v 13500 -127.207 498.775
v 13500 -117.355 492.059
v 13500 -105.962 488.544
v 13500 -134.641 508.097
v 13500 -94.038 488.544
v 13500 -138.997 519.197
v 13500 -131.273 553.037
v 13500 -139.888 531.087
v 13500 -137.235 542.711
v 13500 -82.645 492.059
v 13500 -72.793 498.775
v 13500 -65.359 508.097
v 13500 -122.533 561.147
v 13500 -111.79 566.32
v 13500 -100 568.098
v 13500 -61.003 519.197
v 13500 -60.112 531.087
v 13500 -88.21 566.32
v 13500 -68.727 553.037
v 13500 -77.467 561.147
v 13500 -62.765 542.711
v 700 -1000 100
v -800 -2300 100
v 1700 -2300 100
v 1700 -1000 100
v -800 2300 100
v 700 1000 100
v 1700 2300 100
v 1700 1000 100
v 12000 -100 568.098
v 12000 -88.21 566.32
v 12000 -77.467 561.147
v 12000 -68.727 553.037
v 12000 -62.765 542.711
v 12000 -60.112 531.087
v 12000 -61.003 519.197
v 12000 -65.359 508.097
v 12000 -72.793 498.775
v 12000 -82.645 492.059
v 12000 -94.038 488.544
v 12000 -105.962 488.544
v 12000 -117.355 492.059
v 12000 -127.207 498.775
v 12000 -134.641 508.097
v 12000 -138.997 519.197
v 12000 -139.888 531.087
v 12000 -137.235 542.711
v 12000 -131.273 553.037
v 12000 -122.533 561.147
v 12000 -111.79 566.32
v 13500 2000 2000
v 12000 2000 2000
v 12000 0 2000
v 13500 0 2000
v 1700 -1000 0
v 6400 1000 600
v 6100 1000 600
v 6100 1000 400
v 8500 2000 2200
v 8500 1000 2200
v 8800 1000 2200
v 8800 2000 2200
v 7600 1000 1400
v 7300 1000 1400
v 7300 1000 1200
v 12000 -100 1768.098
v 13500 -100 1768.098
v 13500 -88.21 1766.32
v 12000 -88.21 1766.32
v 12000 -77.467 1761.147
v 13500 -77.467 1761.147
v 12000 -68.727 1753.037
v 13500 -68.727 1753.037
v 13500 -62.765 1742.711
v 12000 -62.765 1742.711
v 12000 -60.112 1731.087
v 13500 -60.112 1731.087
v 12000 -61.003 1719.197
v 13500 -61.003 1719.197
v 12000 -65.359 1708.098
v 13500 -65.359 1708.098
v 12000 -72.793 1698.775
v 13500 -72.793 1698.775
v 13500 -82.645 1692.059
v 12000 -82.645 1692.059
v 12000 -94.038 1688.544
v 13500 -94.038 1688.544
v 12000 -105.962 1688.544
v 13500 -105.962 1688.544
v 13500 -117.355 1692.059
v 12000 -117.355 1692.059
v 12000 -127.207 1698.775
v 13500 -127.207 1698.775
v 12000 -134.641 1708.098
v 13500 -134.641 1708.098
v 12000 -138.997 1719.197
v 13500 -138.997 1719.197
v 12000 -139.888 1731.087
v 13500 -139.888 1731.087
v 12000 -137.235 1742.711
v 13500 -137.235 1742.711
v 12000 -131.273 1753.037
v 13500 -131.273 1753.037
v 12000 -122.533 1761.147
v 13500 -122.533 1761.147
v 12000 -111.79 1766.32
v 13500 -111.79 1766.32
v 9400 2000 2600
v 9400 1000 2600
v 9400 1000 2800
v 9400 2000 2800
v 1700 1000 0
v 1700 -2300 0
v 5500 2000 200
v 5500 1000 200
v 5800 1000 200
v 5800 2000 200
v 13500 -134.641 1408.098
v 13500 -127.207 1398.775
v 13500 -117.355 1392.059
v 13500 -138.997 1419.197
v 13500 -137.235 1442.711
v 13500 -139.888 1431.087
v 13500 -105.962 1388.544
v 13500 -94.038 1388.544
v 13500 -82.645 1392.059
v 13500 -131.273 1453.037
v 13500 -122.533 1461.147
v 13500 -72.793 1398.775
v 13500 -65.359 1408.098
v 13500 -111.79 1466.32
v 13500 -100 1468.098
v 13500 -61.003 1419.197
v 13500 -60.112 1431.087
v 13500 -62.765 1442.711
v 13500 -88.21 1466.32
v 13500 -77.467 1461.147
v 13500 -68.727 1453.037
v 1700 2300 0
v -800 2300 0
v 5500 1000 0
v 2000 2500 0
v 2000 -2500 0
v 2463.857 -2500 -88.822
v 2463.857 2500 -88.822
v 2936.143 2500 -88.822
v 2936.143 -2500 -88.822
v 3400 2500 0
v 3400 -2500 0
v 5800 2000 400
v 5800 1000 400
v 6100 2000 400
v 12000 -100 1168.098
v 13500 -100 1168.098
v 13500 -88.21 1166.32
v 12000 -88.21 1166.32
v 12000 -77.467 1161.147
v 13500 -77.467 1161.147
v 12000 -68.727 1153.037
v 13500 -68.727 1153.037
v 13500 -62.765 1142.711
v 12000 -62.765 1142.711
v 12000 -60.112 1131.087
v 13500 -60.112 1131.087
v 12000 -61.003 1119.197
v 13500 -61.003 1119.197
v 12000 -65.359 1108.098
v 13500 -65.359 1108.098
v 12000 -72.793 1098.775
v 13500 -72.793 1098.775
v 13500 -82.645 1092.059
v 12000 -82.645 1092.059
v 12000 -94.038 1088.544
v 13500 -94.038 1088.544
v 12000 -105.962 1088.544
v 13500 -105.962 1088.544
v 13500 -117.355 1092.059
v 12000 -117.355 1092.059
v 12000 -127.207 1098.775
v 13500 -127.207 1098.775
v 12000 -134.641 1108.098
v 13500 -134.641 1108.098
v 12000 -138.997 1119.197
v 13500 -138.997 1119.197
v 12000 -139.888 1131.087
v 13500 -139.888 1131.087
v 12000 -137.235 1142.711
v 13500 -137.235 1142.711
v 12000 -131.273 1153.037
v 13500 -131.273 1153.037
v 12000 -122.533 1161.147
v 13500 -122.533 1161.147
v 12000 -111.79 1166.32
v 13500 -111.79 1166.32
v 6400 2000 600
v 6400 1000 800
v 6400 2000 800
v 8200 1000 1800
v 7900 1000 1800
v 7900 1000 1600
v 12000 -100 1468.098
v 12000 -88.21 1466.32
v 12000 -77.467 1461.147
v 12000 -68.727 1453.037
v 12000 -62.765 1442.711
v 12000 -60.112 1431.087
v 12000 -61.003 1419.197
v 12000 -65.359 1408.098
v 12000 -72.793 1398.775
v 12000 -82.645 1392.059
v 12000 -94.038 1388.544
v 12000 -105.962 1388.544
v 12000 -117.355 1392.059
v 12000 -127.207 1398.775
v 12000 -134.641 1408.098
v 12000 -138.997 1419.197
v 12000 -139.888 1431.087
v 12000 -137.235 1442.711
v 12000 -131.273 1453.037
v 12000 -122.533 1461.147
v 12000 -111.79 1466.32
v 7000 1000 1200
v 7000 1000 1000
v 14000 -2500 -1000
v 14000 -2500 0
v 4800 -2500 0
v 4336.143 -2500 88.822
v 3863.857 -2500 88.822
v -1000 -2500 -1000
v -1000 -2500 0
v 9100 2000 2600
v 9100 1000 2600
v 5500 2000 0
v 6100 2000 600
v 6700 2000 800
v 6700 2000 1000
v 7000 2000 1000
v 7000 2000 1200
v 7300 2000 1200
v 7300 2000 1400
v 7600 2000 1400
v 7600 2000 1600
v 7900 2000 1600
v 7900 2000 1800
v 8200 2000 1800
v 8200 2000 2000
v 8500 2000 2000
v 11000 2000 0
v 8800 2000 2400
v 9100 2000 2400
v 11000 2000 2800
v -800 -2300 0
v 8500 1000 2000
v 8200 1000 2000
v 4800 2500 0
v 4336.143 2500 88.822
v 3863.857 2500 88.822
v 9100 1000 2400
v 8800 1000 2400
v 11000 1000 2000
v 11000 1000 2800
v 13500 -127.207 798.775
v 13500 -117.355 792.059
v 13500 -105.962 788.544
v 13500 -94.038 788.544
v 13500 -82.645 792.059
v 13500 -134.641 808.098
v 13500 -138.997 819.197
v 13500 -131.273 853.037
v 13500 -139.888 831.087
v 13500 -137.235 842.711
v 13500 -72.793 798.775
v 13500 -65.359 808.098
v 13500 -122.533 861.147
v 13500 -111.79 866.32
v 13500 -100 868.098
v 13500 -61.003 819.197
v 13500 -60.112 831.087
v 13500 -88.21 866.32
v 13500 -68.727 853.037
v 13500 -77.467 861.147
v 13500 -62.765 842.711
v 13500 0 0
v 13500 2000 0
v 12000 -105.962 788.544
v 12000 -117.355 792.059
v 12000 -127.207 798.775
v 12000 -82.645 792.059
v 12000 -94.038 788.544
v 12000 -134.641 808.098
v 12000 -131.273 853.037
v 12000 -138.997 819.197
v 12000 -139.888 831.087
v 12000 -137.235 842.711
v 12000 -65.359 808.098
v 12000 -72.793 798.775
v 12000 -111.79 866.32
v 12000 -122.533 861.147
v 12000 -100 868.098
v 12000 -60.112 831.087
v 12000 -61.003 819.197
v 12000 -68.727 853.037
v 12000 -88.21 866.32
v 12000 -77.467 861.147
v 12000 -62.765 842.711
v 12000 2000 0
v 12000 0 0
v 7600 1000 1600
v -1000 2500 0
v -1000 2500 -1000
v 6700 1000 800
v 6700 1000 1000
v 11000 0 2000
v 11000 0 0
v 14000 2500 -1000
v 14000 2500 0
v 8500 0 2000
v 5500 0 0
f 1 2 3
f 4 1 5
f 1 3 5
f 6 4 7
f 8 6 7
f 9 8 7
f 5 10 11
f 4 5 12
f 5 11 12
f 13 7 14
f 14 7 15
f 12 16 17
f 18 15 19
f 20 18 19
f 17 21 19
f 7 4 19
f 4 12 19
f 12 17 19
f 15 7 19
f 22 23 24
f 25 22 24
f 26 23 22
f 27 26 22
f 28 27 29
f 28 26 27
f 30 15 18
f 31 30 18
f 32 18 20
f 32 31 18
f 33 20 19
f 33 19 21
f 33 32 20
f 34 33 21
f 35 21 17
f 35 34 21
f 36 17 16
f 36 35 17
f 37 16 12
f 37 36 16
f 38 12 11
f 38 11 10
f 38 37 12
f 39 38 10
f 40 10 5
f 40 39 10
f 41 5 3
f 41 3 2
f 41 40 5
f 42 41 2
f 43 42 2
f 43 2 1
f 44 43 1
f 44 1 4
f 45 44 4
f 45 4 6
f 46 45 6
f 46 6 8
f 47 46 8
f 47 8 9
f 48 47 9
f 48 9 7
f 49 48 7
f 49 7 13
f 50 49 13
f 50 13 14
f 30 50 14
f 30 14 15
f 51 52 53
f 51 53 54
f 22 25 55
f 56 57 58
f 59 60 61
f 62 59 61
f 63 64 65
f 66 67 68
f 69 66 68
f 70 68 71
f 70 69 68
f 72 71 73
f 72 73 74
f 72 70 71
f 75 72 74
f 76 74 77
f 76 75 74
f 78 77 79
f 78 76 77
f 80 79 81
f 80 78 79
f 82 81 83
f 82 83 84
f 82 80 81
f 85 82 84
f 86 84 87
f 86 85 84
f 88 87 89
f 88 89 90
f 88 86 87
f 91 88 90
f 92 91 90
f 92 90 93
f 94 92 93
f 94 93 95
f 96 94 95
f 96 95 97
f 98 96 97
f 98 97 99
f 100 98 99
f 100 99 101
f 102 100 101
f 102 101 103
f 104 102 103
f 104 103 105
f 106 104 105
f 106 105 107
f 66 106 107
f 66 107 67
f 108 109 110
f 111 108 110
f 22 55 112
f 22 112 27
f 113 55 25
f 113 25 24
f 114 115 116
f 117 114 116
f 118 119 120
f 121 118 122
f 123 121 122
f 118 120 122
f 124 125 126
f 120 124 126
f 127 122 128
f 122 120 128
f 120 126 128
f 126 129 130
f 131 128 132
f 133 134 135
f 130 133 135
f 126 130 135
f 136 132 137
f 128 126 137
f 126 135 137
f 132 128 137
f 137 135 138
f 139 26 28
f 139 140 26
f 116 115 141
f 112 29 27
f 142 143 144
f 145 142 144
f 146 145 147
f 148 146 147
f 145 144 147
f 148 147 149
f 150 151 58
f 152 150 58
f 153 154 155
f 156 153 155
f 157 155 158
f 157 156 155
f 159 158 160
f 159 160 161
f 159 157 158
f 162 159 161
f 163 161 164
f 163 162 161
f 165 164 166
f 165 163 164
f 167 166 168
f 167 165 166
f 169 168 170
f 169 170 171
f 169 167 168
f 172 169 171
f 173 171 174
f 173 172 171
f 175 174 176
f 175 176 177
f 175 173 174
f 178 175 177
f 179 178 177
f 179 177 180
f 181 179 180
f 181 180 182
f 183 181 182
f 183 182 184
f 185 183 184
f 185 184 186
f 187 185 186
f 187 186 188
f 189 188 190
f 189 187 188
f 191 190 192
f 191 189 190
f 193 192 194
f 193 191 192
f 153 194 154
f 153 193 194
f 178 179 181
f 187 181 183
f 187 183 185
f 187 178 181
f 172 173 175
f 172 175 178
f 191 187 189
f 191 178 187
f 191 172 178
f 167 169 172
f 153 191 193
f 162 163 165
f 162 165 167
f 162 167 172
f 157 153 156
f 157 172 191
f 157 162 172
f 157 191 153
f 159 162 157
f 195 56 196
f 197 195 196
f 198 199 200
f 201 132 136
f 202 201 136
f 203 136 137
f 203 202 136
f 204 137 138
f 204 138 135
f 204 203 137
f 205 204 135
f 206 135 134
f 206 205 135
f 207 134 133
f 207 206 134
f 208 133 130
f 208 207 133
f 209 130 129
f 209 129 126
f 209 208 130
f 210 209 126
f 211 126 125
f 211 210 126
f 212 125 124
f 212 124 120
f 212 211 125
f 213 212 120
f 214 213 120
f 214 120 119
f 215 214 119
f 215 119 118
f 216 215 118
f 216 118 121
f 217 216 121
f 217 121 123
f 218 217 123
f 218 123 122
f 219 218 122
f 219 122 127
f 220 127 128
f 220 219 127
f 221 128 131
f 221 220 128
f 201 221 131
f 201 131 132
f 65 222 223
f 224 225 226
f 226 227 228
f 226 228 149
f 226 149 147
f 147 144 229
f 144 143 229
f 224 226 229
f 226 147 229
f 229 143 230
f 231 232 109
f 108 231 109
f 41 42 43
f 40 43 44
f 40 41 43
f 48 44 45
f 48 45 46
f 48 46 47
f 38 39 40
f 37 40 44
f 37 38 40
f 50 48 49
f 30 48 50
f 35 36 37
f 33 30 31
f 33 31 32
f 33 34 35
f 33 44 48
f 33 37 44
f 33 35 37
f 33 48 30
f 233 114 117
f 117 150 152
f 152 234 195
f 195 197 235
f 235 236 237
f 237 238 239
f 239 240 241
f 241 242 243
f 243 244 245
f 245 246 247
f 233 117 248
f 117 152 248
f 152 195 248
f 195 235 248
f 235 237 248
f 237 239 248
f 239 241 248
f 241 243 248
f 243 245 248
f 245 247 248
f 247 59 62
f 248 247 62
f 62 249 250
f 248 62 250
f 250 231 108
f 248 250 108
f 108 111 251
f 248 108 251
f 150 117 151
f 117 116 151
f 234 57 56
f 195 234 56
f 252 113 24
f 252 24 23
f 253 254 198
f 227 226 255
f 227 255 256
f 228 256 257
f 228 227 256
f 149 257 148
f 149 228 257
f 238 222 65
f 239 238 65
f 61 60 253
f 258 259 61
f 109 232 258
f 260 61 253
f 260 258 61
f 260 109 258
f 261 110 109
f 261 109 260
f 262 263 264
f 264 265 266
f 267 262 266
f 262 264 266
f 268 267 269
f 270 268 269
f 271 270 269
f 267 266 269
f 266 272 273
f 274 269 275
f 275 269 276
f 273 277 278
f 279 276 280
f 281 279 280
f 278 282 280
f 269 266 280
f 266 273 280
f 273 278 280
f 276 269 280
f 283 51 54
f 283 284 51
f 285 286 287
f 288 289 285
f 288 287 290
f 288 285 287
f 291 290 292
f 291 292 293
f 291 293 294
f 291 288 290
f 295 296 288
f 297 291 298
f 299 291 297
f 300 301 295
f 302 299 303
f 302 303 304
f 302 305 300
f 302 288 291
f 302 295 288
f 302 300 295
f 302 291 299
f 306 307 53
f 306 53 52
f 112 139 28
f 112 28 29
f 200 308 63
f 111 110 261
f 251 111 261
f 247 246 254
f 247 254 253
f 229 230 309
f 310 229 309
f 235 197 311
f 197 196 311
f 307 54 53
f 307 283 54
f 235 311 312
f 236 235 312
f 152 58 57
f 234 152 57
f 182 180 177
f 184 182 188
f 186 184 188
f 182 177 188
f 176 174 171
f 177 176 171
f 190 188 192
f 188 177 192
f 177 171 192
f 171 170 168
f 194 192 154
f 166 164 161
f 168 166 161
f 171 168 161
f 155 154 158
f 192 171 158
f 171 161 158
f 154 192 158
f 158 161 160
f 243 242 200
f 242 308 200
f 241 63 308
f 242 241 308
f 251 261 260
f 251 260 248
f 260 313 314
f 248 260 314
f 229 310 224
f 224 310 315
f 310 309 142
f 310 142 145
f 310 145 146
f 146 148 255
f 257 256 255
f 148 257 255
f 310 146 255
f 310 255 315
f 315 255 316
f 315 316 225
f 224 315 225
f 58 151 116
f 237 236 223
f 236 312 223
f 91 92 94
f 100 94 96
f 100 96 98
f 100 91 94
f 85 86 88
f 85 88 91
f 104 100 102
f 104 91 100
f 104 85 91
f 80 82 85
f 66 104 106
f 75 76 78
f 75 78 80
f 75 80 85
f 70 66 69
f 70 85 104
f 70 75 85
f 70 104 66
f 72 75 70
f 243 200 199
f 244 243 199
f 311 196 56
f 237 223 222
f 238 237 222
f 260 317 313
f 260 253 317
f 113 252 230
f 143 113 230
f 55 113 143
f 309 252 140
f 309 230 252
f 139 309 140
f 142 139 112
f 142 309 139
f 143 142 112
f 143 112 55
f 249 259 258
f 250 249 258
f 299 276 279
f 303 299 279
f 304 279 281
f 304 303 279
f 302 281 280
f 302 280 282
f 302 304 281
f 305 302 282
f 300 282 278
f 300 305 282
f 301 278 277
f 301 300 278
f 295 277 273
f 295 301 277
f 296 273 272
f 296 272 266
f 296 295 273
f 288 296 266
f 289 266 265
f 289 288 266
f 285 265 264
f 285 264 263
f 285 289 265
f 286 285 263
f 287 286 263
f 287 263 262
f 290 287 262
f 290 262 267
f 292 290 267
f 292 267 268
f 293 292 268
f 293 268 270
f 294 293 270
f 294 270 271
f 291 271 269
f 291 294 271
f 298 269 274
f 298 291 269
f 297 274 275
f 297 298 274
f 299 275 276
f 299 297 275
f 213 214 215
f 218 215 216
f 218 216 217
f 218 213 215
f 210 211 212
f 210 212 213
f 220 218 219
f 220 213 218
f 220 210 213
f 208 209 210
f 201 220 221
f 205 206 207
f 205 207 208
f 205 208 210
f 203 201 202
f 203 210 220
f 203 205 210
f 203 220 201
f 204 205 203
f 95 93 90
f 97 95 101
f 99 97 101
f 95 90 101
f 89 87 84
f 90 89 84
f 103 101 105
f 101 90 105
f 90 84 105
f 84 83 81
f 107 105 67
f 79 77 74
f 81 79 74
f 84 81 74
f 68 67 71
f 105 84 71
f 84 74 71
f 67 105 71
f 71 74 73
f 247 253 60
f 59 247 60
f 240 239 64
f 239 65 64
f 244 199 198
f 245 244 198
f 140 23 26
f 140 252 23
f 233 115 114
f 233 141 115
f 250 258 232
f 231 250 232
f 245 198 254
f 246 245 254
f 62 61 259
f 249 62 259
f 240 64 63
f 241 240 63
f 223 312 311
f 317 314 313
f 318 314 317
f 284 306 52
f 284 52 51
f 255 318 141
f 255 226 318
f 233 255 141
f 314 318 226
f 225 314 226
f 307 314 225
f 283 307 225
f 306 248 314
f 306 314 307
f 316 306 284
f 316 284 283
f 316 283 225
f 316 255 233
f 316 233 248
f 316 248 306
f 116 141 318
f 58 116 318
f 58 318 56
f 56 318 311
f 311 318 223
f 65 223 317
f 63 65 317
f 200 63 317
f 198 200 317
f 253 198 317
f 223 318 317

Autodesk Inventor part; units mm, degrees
ref_plane "YZ Plane" through (0, 0, 0) normal (1, 0, 0) x (0, 1, 0)
ref_plane "XZ Plane" through (0, 0, 0) normal (0, 1, 0) x (-1, 0, 0)
ref_plane "XY Plane" through (0, 0, 0) normal (0, 0, 1) x (1, 0, 0)
sketch "スケッチ1" plane through (0, 0, 0) normal (0, 0, 1) x (1, 0, 0)
  line L0 (-1000, 2500) -> (14000, 2500)
  line L1 (14000, 2500) -> (14000, -2500)
  line L2 (14000, -2500) -> (-1000, -2500)
  line L3 (-1000, -2500) -> (-1000, 2500)
  line L4 (0, 3500) -> (0, -3500) projected
  point P0 (0, 0)
  point P1 (-1000, 0)
  dimension "d0" = 5000
  dimension "d1" = 1000
  dimension "d2" = 15000
extrude "押し出し1" add sketch "スケッチ1" against normal blind 1000
sketch "スケッチ2" plane through (0, 0, 0) normal (0, 0, 1) x (1, 0, 0)
  line L0 (12000, 2000) -> (13500, 2000)
  line L1 (13500, 2000) -> (13500, 0)
  line L2 (13500, 0) -> (12000, 0)
  line L3 (12000, 0) -> (12000, 2000)
  line L4 (14000, 2500) -> (-1000, 2500) projected
  line L5 (14000, -2500) -> (14000, 2500) projected
  point P0 (0, 0)
  dimension "d31" = 1500
  dimension "d32" = 2000
  dimension "d72" = 500
  dimension "d73" = 500
extrude "押し出し2" add sketch "スケッチ2" along normal blind 2000
sketch "スケッチ3" plane through (0, 0, 0) normal (0, 0, 1) x (1, 0, 0)
  line L0 (5500, 2000) -> (11000, 2000)
  line L1 (11000, 2000) -> (11000, 0)
  line L2 (11000, 0) -> (5500, 0)
  line L3 (5500, 0) -> (5500, 2000)
  line L4 (12000, 2000) -> (12000, 0) projected
  point P0 (0, 0)
  dimension "d28" = 1000
  dimension "d35" = 2000
  dimension "d71" = 5500
extrude "押し出し3" add sketch "スケッチ3" along normal blind 2000
sketch "スケッチ4" plane through (5500, 0, 0) normal (0, -1, 0) x (1, 0, 0)
  line L0 (0, 0) -> (3000, 2000)
  line L1 (3000, 2000) -> (0, 2000)
  line L2 (0, 2000) -> (0, 0)
  line L3 (0, 0) -> (0, 2000) projected
  line L4 (-6500, 0) -> (8500, 0) projected
  point P0 (-5500, 0)
  dimension "d23" = 3000
extrude "押し出し4" cut sketch "スケッチ4" against normal blind 1000
sketch "スケッチ5" plane through (12000, 0, 0) normal (-1, 0, 0) x (0, 0, 1)
  circle A0 centre (1728.0975, -100) radius 40
  circle A1 centre (1428.0975, -100) radius 40
  circle A2 centre (1128.0975, -100) radius 40
  circle A3 centre (828.0975, -100) radius 40
  circle A4 centre (528.0975, -100) radius 40
  line L0 (0, 0) -> (2000, 0) projected
  line L1 (0, 2500) -> (0, -2500) projected
  point P0 (0, 0)
  dimension "d11" = 80
  dimension "d12" = 80
  dimension "d13" = 80
  dimension "d14" = 80
  dimension "d15" = 80
  dimension "d16" = 300
  dimension "d17" = 300
  dimension "d18" = 300
  dimension "d19" = 300
  dimension "d20" = 100
  dimension "d82" = 528.0975
extrude "押し出し5" add sketch "スケッチ5" against normal blind 1500
sketch "スケッチ6" plane through (5500, 1000, 0) normal (0, -1, 0) x (1, 0, 0)
  line L0 (0, 0) -> (0, 2000) projected
  line L1 (0, 200) -> (300, 200)
  line L2 (300, 200) -> (300, 400)
  line L3 (300, 400) -> (600, 400)
  line L4 (600, 400) -> (600, 600)
  line L5 (600, 600) -> (900, 600)
  line L6 (900, 600) -> (900, 800)
  line L7 (900, 800) -> (1200, 800)
  line L8 (1200, 800) -> (1200, 1000)
  line L9 (1200, 1000) -> (1500, 1000)
  line L10 (1500, 1000) -> (1500, 1200)
  line L11 (1500, 1200) -> (1800, 1200)
  line L12 (1800, 1200) -> (1800, 1400)
  line L13 (1800, 1400) -> (2100, 1400)
  line L14 (2100, 1400) -> (2100, 1600)
  line L15 (2100, 1600) -> (2400, 1600)
  line L16 (2400, 1600) -> (2400, 1800)
  line L17 (2400, 1800) -> (2700, 1800)
  line L18 (2700, 1800) -> (2700, 2000)
  line L19 (2700, 2000) -> (0, 2000)
  line L20 (0, 2000) -> (0, 200)
  line L21 (-6500, 0) -> (8500, 0) projected
  point P0 (-5500, 0)
  dimension "d46" = 200
  dimension "d47" = 300
  dimension "d48" = 200
  dimension "d49" = 300
  dimension "d50" = 200
  dimension "d51" = 300
  dimension "d52" = 200
  dimension "d53" = 300
  dimension "d54" = 200
  dimension "d55" = 300
  dimension "d56" = 200
  dimension "d57" = 300
  dimension "d58" = 200
  dimension "d59" = 300
  dimension "d60" = 200
  dimension "d61" = 300
  dimension "d62" = 200
  dimension "d63" = 300
extrude "押し出し6" cut sketch "スケッチ6" against normal blind 1500
sketch "スケッチ7" plane through (0, 0, 0) normal (0, 0, 1) x (1, 0, 0)
  line L0 (-800, 2300) -> (1700, 2300)
  line L1 (1700, 2300) -> (1700, -2300)
  line L2 (1700, -2300) -> (-800, -2300)
  line L3 (-800, -2300) -> (-800, 2300)
  line L4 (-1000, 2500) -> (-1000, -2500) projected
  line L5 (14000, 2500) -> (-1000, 2500) projected
  line L6 (-1000, -2500) -> (14000, -2500) projected
  point P0 (0, 0)
  dimension "d74" = 200
  dimension "d75" = 200
  dimension "d76" = 200
  dimension "d77" = 2500
extrude "押し出し7" add sketch "スケッチ7" along normal blind 100
sketch "スケッチ8" plane through (5500, 1000, 0) normal (0, -1, 0) x (1, 0, 0)
  line L0 (3000, 2000) -> (3000, 2200)
  line L1 (3000, 2200) -> (3300, 2200)
  line L2 (3300, 2200) -> (3300, 2400)
  line L3 (3300, 2400) -> (3600, 2400)
  line L4 (3600, 2400) -> (3600, 2600)
  line L5 (3600, 2600) -> (3900, 2600)
  line L6 (3900, 2600) -> (3900, 2800)
  line L7 (3900, 2800) -> (4177.5018, 2800)
  line L8 (4177.5018, 2800) -> (5500, 2800)
  line L9 (5500, 2000) -> (2700, 2000) projected
  line L10 (5500, 2800) -> (5500, 2000)
  line L11 (5500, 2000) -> (3000, 2000)
  point P0 (-5500, 0)
  point P1 (3020.6908, 2000)
  dimension "d64" = 200
  dimension "d65" = 300
  dimension "d66" = 200
  dimension "d67" = 300
  dimension "d68" = 200
  dimension "d69" = 300
  dimension "d70" = 200
extrude "押し出し8" add sketch "スケッチ8" against normal blind 1000
sketch "スケッチ9" plane through (0, 0, 0) normal (0, 1, 0) x (-1, 0, 0)
  line L0 (-1700, 0) -> (-1700, 100) projected
  line L1 (-1700, 0) -> (-700, 100)
  line L2 (-700, 100) -> (-1700, 100)
  line L3 (-1700, 100) -> (-1700, 0)
  point P0 (0, 0)
  dimension "d78" = 1000
extrude "押し出し9" cut sketch "スケッチ9" along normal mid plane 2000
sketch "スケッチ11" plane through (-1000, -2500, 0) normal (0, -1, 0) x (1, 0, 0)
  circle A0 centre (3700, 2400) radius 2500
  line L0 (0, 0) -> (15000, 0) projected
  line L1 (2700, 0) -> (2700, 100) projected
  line L2 (4400, 0) -> (3000, 0)
  line L3 (3247.7684, -100) -> (4192.4958, -100) construction
  point P0 (1000, 0)
  dimension "d36" = 5000
  dimension "d38" = 2400
  dimension "d79" = 1000
  dimension "d80" = 1400
  dimension "d81" = 100
extrude "押し出し10" cut sketch "スケッチ11" against normal through all
sketch "スケッチ12" plane through (-1000, -2500, -1000) normal (0, -1, 0) x (1, 0, 0)
  arc A0 (7171.2315, 0) -> (3028.7685, 0) centre (5100, -1400) ccw
  arc A1 (3000, 1000) -> (4400, 1000) centre (3700, 3400) ccw projected
  line L0 (4400, 1000) -> (15000, 1000) projected
  line L1 (15000, 0) -> (0, 0) projected
  line L2 (7171.2315, 0) -> (3028.7685, 0)
  point P0 (1000, 1000)
  dimension "d42" = 5000
  dimension "d43" = 2400
extrude "押し出し11" add sketch "スケッチ12" against normal blind 5000
properties part number "Terrain2021"
